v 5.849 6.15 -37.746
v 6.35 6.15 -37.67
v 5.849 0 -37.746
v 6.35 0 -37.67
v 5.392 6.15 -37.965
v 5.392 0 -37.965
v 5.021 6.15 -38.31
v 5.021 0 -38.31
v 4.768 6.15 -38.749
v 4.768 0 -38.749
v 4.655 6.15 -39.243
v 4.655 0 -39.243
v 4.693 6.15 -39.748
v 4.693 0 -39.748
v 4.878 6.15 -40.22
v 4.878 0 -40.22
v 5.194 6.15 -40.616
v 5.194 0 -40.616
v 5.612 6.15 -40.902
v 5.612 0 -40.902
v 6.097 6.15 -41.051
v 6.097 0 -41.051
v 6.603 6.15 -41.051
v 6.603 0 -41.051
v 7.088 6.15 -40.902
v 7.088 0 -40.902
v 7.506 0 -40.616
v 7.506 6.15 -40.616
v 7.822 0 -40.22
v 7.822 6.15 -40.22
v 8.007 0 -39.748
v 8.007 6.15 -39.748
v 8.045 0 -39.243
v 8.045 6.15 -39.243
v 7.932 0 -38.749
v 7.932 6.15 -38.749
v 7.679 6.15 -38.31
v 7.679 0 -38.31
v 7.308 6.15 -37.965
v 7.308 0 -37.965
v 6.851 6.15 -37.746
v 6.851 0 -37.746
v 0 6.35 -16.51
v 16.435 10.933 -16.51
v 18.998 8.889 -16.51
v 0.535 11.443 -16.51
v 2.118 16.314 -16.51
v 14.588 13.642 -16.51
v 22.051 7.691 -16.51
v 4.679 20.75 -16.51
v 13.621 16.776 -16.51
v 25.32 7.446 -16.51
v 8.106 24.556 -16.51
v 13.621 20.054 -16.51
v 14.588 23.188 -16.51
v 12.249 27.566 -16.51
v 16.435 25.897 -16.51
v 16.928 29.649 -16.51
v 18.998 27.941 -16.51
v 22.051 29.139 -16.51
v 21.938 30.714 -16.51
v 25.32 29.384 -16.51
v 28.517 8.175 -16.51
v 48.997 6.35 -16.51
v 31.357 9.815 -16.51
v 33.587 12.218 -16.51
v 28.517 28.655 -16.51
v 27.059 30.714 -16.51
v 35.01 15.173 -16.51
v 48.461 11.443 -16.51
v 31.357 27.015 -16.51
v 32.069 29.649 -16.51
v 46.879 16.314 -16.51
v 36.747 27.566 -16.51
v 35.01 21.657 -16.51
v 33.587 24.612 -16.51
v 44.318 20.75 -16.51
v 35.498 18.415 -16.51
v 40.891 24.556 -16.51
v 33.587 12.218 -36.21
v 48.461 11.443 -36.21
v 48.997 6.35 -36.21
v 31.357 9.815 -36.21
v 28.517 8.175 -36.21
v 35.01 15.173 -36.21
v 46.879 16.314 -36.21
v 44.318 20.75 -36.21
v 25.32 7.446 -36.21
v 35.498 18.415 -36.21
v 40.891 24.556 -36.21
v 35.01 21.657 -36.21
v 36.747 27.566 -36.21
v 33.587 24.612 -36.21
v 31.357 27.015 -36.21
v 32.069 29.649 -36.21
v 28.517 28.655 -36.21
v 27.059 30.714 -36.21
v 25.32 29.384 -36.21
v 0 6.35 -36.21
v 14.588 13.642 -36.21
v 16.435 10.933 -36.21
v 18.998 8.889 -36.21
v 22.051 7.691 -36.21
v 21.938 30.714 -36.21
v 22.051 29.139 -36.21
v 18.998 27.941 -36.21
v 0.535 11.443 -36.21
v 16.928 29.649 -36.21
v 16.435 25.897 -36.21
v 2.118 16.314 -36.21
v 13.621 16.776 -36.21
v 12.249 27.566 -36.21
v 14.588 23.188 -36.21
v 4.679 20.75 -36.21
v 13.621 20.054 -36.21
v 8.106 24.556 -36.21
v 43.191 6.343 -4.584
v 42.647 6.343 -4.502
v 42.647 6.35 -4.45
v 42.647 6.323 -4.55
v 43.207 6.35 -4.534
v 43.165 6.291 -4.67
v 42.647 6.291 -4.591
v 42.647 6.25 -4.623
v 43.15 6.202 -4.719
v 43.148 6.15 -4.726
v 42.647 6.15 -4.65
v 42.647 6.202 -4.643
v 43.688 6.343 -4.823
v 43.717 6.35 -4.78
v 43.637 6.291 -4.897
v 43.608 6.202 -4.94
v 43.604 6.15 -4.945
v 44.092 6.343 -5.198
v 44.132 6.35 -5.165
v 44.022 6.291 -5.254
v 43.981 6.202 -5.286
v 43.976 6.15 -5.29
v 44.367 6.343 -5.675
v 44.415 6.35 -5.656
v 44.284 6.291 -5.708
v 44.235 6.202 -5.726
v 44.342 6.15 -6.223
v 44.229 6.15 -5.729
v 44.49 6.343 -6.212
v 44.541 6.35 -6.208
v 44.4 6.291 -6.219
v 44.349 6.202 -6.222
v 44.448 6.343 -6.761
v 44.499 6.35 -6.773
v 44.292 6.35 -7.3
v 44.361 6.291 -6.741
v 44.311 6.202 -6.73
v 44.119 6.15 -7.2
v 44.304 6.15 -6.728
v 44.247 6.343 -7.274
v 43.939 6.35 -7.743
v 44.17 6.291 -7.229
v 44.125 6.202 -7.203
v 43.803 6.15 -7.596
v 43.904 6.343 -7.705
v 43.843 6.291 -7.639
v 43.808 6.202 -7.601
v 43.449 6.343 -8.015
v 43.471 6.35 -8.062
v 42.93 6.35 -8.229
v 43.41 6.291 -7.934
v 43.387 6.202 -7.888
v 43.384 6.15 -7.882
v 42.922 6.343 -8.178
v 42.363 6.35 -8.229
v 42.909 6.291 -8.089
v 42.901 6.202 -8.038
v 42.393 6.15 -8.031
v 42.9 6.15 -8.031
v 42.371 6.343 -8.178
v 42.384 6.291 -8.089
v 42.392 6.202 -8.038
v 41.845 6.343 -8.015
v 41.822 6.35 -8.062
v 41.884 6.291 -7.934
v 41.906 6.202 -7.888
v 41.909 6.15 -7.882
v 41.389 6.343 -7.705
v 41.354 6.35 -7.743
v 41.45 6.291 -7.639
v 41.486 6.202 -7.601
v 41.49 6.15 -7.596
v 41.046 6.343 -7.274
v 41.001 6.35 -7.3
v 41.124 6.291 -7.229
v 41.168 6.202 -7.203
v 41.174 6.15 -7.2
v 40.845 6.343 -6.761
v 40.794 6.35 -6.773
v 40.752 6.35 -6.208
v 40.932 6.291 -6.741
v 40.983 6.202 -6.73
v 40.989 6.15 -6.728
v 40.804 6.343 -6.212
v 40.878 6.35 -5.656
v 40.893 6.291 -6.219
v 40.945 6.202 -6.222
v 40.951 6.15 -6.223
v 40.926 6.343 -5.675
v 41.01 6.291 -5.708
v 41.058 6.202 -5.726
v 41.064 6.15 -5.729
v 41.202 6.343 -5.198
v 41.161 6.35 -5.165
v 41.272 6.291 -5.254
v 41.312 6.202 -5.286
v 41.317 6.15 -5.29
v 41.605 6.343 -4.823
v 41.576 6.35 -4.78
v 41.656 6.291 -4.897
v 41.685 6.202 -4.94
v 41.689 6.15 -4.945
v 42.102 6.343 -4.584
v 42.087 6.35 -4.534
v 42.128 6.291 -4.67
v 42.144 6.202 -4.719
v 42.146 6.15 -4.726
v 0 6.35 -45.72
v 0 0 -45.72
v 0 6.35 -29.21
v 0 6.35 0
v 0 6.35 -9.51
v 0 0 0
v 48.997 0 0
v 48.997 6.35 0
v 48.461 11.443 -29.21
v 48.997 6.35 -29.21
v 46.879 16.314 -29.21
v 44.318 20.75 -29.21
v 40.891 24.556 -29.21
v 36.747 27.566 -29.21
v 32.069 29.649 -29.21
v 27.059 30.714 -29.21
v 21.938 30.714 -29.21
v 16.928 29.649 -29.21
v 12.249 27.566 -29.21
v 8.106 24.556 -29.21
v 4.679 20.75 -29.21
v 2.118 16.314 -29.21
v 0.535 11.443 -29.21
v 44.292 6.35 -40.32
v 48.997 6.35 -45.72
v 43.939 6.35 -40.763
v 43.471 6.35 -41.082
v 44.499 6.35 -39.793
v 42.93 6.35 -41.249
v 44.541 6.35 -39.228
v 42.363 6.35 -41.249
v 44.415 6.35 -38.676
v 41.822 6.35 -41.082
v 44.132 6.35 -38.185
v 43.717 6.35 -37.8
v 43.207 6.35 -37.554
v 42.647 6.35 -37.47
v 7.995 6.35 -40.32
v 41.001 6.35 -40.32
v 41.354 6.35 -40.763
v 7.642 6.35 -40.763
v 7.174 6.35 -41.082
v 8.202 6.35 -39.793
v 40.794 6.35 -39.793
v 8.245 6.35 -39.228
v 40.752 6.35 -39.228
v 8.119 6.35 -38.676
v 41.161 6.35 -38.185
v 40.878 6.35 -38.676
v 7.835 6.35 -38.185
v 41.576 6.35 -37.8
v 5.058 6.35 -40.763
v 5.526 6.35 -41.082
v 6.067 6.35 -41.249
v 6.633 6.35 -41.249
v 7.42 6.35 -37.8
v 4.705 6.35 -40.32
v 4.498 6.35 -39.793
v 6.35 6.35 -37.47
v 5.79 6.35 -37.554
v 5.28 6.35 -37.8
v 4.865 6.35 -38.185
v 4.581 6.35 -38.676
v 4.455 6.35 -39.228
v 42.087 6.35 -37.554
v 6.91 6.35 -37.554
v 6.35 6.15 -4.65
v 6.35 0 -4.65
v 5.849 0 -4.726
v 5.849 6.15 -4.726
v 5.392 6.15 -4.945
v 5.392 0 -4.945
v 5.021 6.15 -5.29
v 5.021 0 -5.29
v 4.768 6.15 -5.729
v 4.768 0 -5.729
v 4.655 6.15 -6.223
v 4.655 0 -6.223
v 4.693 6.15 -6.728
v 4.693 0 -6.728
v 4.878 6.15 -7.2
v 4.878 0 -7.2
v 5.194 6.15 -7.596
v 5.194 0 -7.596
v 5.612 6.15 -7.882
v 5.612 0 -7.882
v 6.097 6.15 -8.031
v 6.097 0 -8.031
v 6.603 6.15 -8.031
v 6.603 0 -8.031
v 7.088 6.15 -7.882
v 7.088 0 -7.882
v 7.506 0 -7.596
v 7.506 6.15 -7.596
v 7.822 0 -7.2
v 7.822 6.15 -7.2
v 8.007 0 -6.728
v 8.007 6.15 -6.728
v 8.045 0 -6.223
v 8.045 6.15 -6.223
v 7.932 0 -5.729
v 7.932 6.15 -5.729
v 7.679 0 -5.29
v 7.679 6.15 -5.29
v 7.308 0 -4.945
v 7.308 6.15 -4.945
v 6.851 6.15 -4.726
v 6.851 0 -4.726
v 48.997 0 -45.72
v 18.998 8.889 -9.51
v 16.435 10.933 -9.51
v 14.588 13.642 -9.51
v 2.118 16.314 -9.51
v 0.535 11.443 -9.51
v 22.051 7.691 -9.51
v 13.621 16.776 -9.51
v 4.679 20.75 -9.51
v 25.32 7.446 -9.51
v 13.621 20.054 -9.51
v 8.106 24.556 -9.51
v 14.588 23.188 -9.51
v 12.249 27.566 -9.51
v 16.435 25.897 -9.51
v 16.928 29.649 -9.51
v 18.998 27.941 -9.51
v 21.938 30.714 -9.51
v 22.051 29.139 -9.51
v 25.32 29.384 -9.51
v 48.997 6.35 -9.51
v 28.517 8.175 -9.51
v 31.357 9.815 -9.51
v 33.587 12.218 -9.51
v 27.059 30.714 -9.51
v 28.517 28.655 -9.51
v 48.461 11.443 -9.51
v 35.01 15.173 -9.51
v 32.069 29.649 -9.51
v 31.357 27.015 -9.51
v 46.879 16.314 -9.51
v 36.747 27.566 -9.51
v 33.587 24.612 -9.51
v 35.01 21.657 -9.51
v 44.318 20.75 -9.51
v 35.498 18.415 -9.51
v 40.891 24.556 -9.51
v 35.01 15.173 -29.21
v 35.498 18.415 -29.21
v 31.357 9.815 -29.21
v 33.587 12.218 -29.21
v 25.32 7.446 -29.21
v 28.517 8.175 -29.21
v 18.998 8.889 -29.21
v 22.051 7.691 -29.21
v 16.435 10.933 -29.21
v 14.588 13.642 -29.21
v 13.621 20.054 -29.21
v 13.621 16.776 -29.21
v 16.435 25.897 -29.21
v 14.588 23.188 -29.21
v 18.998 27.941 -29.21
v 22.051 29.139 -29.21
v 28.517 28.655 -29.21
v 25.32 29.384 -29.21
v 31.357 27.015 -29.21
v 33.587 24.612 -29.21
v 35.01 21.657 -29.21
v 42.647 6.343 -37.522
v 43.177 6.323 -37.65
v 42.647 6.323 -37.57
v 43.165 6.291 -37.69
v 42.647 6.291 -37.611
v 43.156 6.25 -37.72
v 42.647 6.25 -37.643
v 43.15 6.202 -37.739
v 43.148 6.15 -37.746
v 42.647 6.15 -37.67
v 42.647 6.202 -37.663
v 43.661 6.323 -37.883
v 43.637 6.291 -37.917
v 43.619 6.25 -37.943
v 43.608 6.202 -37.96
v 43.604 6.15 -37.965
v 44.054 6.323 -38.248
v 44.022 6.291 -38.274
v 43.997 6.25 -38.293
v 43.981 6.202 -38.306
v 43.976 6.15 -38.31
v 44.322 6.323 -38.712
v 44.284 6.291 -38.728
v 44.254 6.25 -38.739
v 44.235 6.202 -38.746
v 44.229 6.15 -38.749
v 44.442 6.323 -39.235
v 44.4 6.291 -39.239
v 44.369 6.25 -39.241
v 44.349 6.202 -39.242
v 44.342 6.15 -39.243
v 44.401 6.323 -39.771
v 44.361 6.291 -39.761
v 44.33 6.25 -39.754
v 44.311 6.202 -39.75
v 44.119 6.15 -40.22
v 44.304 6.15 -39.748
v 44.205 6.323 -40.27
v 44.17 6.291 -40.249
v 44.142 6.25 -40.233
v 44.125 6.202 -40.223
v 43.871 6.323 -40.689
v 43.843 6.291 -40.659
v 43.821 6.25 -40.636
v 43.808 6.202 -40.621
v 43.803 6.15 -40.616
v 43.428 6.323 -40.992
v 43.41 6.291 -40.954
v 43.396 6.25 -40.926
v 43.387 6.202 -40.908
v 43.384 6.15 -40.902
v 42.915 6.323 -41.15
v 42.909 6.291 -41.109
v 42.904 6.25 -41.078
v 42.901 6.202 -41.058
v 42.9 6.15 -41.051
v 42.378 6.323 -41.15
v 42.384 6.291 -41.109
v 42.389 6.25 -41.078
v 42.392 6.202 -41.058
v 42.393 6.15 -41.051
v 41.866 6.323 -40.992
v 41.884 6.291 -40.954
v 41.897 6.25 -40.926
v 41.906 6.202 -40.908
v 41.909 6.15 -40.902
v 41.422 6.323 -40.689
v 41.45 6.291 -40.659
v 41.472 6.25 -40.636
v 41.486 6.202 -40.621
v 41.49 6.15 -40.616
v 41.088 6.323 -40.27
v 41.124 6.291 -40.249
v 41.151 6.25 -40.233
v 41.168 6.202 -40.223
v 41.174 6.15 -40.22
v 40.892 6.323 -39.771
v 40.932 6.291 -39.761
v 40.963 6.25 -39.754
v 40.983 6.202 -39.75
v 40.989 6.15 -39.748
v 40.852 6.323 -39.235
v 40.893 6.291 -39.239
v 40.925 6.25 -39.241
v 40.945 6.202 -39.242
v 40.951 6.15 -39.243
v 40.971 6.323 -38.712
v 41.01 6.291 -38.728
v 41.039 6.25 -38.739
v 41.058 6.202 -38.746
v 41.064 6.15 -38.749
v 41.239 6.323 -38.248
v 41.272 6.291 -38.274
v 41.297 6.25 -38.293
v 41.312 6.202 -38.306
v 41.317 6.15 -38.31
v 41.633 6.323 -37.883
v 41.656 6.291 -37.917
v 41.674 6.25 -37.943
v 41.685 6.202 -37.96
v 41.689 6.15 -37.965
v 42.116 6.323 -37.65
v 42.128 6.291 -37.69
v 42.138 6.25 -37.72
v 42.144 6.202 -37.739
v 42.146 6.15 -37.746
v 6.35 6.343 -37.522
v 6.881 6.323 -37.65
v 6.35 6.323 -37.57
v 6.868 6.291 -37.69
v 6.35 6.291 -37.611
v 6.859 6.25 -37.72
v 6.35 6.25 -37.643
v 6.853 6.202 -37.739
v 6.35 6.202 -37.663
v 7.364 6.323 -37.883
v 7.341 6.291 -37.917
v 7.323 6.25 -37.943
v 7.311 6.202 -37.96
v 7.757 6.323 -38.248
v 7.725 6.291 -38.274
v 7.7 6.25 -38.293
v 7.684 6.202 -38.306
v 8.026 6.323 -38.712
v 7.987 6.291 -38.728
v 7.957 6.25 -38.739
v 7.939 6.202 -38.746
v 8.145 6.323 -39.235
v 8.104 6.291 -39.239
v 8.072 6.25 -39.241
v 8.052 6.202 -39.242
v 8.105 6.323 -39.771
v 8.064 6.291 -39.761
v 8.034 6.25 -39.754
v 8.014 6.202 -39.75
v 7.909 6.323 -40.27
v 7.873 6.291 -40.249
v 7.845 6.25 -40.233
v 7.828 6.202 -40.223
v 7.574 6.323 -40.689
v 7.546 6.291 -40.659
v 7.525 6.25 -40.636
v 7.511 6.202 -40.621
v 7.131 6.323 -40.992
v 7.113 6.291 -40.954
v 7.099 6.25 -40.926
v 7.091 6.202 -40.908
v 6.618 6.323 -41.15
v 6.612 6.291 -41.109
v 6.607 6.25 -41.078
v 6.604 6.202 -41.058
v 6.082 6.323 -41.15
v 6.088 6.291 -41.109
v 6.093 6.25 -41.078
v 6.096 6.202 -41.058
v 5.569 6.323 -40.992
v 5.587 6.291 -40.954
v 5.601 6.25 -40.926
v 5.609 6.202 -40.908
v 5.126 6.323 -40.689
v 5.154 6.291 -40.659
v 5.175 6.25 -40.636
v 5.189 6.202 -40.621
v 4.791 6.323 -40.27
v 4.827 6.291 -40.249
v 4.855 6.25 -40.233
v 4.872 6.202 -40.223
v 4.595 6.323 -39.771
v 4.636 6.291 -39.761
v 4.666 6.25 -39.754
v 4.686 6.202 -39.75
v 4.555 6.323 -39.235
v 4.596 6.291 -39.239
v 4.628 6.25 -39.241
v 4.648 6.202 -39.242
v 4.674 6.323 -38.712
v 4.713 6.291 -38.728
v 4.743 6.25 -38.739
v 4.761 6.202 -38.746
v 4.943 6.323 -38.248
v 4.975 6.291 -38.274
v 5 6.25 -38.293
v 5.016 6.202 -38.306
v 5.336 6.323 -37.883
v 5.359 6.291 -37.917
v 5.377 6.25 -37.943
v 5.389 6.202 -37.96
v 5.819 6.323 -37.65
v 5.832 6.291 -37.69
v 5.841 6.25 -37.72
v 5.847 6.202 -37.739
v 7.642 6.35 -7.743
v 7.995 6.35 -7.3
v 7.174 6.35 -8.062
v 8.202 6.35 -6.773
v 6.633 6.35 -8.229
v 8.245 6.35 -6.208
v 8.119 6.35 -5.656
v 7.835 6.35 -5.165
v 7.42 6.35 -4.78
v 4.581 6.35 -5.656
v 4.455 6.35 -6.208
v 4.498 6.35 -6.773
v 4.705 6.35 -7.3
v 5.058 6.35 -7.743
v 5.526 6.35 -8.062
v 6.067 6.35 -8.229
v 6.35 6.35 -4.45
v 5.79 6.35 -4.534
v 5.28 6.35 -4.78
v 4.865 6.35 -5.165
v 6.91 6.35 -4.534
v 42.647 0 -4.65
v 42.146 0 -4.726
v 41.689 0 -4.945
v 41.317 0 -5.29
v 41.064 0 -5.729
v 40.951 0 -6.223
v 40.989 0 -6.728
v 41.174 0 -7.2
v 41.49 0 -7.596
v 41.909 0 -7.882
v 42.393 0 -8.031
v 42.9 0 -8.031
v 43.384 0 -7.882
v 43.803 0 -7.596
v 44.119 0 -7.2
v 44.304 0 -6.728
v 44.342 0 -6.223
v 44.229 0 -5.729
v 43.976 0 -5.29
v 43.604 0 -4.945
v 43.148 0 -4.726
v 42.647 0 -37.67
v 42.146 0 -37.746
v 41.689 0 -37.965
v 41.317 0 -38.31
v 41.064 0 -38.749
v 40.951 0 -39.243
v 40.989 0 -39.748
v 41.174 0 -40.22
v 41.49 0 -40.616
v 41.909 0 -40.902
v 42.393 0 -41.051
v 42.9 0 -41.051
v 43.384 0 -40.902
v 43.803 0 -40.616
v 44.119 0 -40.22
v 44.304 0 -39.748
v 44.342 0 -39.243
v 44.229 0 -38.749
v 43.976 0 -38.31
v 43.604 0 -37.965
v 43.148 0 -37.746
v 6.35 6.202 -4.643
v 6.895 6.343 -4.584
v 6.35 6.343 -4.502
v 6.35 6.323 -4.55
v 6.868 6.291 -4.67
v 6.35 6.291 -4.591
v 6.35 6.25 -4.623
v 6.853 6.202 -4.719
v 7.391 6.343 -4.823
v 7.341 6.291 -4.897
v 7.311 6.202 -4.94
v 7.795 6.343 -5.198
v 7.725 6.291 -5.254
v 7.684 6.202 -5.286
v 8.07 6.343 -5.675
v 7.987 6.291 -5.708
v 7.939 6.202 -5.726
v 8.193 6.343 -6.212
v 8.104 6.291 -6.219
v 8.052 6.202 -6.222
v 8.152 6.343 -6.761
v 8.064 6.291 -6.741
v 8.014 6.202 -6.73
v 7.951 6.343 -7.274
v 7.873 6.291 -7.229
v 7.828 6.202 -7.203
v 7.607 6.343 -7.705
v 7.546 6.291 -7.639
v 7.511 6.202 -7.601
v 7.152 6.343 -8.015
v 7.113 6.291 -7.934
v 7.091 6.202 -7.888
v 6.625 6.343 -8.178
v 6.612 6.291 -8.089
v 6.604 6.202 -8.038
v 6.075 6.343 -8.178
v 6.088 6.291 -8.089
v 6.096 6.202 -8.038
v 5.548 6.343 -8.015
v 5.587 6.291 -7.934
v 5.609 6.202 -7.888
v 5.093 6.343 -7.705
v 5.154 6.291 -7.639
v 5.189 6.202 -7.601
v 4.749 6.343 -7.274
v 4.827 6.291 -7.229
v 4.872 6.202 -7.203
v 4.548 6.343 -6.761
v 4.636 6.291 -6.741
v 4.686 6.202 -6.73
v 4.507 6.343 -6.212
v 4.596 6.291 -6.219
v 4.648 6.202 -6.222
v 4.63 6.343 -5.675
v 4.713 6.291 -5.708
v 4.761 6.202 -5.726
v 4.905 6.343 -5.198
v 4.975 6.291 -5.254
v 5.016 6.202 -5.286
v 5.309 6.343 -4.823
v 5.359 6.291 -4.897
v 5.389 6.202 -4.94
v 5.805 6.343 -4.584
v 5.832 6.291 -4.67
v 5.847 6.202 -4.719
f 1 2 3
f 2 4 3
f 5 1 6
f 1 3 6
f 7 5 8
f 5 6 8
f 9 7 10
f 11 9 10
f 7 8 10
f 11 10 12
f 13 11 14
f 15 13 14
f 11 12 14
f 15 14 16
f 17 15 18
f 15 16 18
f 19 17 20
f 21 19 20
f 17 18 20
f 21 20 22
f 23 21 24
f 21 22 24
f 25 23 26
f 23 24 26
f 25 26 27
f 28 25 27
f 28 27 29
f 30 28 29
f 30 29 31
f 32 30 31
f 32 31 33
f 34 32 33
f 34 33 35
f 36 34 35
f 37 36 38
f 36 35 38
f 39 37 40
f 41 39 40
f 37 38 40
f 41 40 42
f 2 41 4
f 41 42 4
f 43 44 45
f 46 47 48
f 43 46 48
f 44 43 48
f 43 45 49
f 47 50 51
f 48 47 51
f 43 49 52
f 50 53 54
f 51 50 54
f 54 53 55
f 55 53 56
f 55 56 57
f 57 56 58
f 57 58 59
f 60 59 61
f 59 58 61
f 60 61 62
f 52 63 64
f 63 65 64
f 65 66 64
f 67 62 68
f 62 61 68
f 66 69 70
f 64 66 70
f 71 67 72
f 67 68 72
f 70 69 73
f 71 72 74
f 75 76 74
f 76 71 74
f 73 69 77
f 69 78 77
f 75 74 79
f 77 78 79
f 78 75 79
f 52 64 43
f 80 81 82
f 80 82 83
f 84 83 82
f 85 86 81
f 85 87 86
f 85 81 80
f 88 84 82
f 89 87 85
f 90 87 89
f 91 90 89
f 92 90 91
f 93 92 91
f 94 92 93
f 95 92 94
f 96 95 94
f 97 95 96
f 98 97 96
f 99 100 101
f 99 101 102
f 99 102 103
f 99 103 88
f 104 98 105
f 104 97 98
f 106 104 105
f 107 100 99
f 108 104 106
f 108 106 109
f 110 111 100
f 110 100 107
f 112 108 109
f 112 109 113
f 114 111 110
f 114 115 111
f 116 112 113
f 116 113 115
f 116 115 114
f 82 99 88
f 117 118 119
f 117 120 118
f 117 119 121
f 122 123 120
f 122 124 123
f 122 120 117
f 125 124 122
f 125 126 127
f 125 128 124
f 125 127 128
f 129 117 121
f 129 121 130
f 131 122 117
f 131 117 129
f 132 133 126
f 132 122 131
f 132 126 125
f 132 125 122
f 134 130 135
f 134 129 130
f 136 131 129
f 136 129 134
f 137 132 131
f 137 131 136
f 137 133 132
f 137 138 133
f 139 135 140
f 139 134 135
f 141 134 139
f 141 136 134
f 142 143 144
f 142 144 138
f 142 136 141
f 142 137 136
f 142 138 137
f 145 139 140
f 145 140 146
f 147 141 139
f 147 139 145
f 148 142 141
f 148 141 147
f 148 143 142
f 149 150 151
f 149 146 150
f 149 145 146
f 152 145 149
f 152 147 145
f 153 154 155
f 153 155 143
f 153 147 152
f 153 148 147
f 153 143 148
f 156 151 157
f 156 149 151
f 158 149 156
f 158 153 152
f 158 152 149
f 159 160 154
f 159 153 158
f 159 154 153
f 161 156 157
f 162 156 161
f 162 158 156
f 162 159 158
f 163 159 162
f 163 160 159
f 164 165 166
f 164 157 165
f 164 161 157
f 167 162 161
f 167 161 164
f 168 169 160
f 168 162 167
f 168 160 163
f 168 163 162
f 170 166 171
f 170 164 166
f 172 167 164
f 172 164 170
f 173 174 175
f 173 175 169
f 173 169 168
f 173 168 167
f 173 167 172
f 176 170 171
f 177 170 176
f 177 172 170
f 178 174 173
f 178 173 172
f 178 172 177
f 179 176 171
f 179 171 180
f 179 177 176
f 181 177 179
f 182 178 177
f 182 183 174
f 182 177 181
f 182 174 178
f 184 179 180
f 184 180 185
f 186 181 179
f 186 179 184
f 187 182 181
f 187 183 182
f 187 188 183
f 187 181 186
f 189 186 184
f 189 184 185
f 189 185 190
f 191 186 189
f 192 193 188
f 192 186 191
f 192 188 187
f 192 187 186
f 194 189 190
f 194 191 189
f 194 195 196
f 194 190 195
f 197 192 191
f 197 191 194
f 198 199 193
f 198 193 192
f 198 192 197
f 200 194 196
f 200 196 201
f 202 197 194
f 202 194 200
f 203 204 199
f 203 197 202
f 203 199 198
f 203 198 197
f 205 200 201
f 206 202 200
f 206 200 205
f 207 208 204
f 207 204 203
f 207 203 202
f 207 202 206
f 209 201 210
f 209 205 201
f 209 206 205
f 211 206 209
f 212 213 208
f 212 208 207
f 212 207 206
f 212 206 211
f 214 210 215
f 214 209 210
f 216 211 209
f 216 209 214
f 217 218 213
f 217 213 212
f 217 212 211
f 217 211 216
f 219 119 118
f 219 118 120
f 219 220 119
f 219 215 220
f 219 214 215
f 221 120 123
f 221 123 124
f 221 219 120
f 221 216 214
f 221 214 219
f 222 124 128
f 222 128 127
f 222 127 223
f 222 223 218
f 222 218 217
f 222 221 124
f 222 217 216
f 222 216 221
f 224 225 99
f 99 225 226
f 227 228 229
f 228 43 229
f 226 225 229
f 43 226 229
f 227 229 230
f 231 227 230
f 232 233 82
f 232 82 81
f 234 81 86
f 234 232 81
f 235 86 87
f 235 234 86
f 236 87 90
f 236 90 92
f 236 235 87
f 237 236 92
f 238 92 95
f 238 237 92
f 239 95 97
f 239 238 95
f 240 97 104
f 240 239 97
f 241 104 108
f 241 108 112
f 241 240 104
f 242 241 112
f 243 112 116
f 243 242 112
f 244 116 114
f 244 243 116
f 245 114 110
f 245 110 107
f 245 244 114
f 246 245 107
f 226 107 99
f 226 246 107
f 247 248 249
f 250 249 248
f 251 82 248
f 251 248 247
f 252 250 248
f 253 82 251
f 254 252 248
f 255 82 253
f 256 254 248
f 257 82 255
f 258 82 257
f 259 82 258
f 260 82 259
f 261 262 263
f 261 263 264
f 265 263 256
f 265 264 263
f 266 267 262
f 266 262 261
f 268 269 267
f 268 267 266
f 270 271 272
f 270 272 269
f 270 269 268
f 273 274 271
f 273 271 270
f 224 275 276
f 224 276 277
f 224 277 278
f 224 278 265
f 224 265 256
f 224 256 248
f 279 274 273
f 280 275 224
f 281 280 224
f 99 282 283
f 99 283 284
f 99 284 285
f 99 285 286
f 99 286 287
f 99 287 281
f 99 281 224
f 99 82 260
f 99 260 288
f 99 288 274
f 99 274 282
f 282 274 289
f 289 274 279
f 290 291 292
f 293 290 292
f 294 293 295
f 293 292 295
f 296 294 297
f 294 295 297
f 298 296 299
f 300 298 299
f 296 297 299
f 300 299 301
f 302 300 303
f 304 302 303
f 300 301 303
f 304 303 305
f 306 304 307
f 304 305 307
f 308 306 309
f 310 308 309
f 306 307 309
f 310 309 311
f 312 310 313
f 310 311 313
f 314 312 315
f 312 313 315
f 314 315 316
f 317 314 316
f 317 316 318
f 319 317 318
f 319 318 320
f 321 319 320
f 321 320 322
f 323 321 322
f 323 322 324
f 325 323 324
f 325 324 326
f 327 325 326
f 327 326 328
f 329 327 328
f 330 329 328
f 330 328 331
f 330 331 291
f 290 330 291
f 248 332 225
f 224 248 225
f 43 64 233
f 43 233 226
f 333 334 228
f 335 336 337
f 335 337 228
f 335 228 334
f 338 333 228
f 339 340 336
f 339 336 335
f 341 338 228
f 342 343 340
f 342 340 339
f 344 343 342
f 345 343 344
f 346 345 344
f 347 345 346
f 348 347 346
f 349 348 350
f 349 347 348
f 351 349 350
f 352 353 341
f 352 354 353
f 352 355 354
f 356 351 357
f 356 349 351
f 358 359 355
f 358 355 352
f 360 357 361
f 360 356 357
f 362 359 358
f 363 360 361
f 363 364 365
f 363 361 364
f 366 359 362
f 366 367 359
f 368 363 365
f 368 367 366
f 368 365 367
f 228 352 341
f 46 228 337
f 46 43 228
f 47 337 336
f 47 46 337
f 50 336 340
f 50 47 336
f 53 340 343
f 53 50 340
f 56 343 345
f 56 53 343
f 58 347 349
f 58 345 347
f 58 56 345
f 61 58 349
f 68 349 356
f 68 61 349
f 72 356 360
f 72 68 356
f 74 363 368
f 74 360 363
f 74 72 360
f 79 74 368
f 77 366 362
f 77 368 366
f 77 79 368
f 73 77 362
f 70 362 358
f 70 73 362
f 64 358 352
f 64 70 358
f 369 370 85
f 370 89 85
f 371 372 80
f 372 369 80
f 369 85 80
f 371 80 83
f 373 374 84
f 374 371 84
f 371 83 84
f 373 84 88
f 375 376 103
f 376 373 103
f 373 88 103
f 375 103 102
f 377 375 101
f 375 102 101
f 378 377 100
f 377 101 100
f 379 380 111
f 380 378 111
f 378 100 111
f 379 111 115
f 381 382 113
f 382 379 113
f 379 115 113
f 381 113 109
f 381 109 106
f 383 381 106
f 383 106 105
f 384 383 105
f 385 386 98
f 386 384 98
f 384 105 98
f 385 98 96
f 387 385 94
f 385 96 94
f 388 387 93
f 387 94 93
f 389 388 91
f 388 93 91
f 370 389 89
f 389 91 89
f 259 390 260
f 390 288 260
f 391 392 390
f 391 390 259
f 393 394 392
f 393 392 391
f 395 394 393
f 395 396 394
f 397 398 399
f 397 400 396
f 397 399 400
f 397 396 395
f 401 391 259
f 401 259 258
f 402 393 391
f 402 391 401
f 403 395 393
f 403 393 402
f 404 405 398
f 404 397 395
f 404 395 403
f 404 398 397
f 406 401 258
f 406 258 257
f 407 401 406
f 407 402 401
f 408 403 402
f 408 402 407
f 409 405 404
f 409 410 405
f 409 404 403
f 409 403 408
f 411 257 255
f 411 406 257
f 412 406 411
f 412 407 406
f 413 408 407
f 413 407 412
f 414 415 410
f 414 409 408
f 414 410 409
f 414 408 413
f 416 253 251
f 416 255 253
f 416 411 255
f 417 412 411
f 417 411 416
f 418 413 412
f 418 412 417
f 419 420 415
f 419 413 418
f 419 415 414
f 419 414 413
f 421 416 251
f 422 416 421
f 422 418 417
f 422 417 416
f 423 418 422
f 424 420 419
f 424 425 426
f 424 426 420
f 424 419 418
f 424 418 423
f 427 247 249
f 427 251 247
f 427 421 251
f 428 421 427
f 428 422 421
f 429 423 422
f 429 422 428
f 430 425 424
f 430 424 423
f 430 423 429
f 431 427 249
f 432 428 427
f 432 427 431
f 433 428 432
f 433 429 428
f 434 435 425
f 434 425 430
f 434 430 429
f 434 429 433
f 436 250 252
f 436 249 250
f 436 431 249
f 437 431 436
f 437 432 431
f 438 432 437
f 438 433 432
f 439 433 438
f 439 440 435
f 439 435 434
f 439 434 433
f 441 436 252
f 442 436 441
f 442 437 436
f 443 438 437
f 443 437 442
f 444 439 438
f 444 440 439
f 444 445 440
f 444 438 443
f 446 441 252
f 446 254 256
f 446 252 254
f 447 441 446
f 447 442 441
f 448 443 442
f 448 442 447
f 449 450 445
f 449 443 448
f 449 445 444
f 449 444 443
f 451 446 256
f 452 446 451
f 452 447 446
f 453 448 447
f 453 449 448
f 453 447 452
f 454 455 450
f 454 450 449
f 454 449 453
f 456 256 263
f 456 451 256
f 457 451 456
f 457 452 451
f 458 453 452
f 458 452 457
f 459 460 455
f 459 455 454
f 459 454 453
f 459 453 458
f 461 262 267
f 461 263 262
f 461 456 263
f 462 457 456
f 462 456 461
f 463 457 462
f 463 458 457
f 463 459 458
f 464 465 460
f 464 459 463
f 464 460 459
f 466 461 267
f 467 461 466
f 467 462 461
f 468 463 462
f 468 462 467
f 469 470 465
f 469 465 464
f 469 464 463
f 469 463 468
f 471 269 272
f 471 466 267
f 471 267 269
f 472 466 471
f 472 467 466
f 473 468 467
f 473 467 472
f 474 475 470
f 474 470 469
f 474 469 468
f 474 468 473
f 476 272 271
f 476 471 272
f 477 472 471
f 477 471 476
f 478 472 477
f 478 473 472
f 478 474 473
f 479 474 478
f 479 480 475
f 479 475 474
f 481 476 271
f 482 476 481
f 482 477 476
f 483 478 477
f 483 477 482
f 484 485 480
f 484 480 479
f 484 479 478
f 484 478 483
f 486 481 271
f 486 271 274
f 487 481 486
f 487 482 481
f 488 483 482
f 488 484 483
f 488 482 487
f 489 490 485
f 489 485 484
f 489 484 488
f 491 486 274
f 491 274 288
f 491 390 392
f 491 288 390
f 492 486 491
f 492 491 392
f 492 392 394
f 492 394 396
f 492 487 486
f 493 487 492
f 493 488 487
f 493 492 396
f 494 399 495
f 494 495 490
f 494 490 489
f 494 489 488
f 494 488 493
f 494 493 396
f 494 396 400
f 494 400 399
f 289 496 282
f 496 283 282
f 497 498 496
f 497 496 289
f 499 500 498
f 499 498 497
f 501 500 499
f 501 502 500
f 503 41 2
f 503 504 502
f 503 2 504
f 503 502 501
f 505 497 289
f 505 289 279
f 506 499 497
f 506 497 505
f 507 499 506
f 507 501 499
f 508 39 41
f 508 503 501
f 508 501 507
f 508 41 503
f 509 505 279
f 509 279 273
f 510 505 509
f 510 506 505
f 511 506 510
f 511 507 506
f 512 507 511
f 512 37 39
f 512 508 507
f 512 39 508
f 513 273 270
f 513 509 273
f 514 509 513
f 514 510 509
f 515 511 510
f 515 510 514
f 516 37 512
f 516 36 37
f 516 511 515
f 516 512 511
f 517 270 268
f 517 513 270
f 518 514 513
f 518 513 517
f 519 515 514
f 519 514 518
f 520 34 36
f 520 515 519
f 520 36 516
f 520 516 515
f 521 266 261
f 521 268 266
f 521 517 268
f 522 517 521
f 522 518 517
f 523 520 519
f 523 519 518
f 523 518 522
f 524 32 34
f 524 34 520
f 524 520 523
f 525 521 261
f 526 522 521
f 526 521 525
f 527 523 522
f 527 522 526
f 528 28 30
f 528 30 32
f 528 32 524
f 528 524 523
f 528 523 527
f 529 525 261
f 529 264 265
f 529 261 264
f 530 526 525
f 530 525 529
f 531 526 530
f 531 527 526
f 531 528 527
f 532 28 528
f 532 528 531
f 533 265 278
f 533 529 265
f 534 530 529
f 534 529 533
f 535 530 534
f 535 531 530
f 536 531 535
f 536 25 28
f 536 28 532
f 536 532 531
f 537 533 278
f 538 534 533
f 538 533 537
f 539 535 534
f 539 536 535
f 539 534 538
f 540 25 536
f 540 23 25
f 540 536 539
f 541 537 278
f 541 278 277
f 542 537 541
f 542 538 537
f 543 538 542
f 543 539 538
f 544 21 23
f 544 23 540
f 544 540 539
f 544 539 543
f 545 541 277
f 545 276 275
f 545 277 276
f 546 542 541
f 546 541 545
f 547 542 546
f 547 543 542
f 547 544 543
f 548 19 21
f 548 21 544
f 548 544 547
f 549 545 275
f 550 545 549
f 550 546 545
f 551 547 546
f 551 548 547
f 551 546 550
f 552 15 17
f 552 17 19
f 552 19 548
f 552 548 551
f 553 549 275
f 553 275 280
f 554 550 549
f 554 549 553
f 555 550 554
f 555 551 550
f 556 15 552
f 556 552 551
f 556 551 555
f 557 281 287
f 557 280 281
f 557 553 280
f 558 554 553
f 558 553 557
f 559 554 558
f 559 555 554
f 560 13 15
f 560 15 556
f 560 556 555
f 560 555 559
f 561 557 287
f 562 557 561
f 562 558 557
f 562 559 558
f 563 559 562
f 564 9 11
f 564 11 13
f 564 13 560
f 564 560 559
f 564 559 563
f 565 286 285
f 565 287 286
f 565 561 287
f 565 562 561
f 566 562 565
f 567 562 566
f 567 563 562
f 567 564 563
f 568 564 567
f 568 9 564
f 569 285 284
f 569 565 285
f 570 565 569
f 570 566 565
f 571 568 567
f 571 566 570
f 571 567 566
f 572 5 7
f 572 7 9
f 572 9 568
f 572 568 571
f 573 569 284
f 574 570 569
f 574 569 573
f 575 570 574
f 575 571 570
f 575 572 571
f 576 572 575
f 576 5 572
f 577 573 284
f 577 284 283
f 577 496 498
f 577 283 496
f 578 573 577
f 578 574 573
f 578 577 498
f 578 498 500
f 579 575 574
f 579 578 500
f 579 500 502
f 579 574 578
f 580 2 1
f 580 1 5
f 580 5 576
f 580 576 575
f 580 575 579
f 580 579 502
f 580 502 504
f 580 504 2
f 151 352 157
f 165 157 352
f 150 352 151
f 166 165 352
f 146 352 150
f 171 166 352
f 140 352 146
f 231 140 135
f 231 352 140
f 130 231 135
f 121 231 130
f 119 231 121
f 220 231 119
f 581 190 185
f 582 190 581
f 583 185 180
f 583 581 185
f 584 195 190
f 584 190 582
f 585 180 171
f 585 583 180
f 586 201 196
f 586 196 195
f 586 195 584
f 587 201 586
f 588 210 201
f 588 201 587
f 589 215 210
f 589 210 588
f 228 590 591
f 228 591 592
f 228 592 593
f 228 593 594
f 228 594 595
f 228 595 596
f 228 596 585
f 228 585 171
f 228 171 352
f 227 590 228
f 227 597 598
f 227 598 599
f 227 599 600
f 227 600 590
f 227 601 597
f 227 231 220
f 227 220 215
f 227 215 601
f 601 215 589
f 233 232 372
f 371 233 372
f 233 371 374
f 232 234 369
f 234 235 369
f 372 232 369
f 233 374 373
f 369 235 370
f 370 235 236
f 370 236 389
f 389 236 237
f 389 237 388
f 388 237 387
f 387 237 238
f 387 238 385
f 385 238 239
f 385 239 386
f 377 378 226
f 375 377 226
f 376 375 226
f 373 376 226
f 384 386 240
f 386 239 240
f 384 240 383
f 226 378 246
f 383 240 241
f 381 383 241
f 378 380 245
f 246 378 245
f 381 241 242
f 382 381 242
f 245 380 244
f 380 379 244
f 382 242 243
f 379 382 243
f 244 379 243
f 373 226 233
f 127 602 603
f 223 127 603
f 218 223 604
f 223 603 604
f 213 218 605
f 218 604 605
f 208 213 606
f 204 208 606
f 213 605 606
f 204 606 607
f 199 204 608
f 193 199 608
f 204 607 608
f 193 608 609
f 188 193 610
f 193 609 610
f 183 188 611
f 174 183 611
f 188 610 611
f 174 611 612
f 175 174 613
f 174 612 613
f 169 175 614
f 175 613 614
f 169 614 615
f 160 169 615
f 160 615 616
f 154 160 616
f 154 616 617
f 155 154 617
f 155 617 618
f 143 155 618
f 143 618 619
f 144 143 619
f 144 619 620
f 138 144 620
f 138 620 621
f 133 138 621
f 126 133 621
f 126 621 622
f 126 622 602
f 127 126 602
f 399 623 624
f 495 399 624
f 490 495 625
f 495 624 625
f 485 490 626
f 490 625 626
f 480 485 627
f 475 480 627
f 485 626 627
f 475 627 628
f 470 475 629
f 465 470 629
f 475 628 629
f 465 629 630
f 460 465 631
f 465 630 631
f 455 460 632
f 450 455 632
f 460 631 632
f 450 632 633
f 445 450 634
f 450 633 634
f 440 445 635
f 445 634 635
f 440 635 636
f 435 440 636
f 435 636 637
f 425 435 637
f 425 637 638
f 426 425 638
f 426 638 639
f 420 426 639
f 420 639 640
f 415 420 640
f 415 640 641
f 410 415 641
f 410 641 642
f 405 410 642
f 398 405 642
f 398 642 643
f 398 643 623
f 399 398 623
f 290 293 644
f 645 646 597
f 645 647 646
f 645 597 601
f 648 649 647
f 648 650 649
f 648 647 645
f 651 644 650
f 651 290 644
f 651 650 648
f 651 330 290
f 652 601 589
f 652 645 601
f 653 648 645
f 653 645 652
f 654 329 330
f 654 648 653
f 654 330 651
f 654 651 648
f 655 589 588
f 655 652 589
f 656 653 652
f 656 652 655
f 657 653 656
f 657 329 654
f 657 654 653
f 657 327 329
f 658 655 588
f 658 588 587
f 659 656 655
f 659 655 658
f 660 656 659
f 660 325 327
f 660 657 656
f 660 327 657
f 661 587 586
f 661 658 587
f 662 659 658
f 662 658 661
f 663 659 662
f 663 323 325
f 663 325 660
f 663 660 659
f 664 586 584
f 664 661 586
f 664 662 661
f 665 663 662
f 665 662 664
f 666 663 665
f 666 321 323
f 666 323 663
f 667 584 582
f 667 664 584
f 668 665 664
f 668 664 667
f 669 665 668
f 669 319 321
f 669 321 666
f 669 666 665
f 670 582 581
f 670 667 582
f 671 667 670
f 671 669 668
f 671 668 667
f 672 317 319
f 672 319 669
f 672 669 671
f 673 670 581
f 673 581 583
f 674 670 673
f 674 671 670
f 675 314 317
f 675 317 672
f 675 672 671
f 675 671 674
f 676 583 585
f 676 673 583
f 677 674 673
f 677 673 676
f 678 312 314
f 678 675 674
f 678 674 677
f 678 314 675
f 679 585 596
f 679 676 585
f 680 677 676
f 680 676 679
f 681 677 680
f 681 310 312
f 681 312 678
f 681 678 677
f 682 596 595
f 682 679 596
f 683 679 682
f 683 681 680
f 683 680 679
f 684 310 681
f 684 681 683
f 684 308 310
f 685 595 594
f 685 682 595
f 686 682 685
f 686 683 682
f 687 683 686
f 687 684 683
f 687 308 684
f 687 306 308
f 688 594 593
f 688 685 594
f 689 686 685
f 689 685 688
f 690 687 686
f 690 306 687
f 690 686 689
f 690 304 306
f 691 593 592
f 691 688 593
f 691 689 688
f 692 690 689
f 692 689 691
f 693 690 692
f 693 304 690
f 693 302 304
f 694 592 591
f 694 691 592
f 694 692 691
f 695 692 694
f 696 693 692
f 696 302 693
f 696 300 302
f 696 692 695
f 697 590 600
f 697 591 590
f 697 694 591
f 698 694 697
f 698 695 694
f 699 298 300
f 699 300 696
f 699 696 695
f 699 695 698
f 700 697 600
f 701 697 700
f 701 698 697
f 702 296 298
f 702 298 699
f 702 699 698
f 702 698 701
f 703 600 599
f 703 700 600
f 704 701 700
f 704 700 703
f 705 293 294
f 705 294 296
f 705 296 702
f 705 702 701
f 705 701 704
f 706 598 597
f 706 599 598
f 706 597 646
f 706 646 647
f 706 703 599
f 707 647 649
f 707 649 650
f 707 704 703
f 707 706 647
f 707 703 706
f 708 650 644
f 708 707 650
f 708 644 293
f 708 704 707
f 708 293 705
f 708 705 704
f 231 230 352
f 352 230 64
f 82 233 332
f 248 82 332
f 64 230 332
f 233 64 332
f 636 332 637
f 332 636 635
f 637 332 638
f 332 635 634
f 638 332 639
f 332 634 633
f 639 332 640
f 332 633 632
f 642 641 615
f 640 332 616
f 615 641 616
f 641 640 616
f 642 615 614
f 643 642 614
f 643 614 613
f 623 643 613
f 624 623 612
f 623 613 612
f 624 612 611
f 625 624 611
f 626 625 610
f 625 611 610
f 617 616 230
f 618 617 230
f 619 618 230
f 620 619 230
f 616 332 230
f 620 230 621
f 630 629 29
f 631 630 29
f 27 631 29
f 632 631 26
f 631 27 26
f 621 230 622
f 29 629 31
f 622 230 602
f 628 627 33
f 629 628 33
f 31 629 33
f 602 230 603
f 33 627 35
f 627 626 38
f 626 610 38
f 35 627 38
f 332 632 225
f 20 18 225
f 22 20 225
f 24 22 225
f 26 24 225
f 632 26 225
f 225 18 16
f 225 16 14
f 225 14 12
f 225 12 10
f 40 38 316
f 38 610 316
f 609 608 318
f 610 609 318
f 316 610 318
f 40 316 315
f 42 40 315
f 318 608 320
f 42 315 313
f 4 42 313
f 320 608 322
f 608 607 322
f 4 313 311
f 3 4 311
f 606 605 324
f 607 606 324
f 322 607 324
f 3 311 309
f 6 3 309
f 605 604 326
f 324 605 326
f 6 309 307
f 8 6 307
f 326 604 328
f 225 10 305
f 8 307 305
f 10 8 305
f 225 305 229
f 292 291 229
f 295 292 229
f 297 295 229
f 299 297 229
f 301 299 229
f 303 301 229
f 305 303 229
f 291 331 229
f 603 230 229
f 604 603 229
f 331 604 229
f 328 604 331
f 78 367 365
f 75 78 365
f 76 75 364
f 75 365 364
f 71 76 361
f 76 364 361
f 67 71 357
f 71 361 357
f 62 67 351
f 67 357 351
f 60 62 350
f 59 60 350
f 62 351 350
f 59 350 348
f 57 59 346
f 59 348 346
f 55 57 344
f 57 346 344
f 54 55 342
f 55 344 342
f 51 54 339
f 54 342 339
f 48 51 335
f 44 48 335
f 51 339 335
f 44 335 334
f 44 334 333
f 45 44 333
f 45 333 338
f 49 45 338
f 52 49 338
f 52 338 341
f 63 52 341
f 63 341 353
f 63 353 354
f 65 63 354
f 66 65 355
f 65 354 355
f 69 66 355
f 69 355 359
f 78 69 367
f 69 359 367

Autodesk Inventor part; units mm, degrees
ref_plane "YZ Plane" through (0, 0, 0) normal (1, 0, 0) x (0, 1, 0)
sketch "Sketch1" plane through (0, 0, 0) normal (0, 1, 0) x (-1, 0, 0)
  line L0 (0, 0) -> (-48.9966, 0)
  line L1 (-48.9966, 0) -> (-48.9966, -45.72)
  line L2 (-48.9966, -45.72) -> (0, -45.72)
  line L3 (0, -45.72) -> (0, 0)
  dimension "d0" = 48.9966
  dimension "d1" = 45.72
extrude "Extrusion1" add sketch "Sketch1" along normal blind 6.35
sketch "Sketch3" plane through (0, 6.35, 0) normal (0, 1, 0) x (1, 0, 0)
  line L0 (0, 45.72) -> (0, 0) projected
  line L1 (48.9966, 0) -> (48.9966, 45.72) projected
  line L2 (0, 29.21) -> (48.9966, 29.21)
  line L3 (48.9966, 29.21) -> (48.9966, 16.51)
  line L4 (48.9966, 16.51) -> (0, 16.51)
  line L5 (0, 16.51) -> (0, 29.21)
  line L6 (48.9966, 45.72) -> (0, 45.72) projected
  dimension "d4" = 12.7
  dimension "d5" = 16.51
sketch "Sketch4" plane through (0, 6.35, 0) normal (0, 1, 0) x (1, 0, 0)
  circle A0 centre (6.35, 39.37) radius 2.1364
  circle A1 centre (42.6466, 39.37) radius 3.0733
  line L0 (48.9966, 45.72) -> (0, 45.72) projected
  line L1 (48.9966, 0) -> (48.9966, 45.72) projected
  line L2 (0, 45.72) -> (0, 0) projected
  circle A2 centre (6.35, 6.35) radius 2.2799
  circle A3 centre (42.6466, 6.35) radius 1.194
  line L3 (0, 0) -> (48.9966, 0) projected
  dimension "d6" = 6.1465
  dimension "d7" = 6.35
  dimension "d8" = 6.35
  dimension "d9" = 6.35
  dimension "d10" = 6.35
  dimension "d11" = 6.35
  dimension "d12" = 6.35
  dimension "d13" = 6.35
  dimension "d14" = 6.35
hole "Hole1" at (6.35, 6.35, -39.37) at (42.6466, 6.35, -39.37) at (42.6466, 6.35, -6.35) at (6.35, 6.35, -6.35) direction (0, -1, 0) diameter 3.4 depth 10 tip angle 118 clearance for "Socket Head Cap Screw" size "M3" standard "Ansi Metric M Profile"
fillet "Fillet1" radius 0.2 4 edges at (42.6466, 6.35, -41.07) (6.35, 6.35, -41.07) (42.6466, 6.35, -8.05) (6.35, 6.35, -8.05)
ref_plane "Work Plane1" through (0, 0, -16.51) normal (0, 0, 1) x (1, 0, 0)
sketch "Sketch5" plane through (0, 0, -16.51) normal (0, 0, 1) x (1, 0, 0)
  line L0 (0, 6.35) -> (48.9966, 6.35)
  line L1 (48.9966, 6.35) -> (0, 6.35) projected
  arc A0 (48.9966, 6.35) -> (0, 6.35) centre (24.4983, 6.35) ccw
  point P0 (0, 0)
extrude "Extrusion2" add sketch "Sketch5" along normal blind 7
ref_plane "Work Plane2" through (0, 0, -22.86) normal (0, 0, 1) x (1, 0, 0)
mirror "Mirror1" about plane through (0, 0, -22.86) normal (0, 0, 1) of "Extrusion2"
sketch "Sketch6" plane through (0, 0, -9.51) normal (0, 0, 1) x (1, 0, 0)
  circle A0 centre (24.4983, 18.415) radius 11
  line L0 (0, 6.35) -> (48.9966, 6.35) projected
  point P0 (0, 0)
  point P1 (24.4983, 6.35)
  point P2 (24.4983, 6.35)
  dimension "d27" = 12.065
  dimension "d28" = 22
extrude "Extrusion3" cut sketch "Sketch6" against normal up to surface (7 mm away)
mirror "Mirror2" about plane through (0, 0, -22.86) normal (0, 0, 1) of "Extrusion3"
properties part number "Carriage Top Second Option" material "Aluminum 6061"
